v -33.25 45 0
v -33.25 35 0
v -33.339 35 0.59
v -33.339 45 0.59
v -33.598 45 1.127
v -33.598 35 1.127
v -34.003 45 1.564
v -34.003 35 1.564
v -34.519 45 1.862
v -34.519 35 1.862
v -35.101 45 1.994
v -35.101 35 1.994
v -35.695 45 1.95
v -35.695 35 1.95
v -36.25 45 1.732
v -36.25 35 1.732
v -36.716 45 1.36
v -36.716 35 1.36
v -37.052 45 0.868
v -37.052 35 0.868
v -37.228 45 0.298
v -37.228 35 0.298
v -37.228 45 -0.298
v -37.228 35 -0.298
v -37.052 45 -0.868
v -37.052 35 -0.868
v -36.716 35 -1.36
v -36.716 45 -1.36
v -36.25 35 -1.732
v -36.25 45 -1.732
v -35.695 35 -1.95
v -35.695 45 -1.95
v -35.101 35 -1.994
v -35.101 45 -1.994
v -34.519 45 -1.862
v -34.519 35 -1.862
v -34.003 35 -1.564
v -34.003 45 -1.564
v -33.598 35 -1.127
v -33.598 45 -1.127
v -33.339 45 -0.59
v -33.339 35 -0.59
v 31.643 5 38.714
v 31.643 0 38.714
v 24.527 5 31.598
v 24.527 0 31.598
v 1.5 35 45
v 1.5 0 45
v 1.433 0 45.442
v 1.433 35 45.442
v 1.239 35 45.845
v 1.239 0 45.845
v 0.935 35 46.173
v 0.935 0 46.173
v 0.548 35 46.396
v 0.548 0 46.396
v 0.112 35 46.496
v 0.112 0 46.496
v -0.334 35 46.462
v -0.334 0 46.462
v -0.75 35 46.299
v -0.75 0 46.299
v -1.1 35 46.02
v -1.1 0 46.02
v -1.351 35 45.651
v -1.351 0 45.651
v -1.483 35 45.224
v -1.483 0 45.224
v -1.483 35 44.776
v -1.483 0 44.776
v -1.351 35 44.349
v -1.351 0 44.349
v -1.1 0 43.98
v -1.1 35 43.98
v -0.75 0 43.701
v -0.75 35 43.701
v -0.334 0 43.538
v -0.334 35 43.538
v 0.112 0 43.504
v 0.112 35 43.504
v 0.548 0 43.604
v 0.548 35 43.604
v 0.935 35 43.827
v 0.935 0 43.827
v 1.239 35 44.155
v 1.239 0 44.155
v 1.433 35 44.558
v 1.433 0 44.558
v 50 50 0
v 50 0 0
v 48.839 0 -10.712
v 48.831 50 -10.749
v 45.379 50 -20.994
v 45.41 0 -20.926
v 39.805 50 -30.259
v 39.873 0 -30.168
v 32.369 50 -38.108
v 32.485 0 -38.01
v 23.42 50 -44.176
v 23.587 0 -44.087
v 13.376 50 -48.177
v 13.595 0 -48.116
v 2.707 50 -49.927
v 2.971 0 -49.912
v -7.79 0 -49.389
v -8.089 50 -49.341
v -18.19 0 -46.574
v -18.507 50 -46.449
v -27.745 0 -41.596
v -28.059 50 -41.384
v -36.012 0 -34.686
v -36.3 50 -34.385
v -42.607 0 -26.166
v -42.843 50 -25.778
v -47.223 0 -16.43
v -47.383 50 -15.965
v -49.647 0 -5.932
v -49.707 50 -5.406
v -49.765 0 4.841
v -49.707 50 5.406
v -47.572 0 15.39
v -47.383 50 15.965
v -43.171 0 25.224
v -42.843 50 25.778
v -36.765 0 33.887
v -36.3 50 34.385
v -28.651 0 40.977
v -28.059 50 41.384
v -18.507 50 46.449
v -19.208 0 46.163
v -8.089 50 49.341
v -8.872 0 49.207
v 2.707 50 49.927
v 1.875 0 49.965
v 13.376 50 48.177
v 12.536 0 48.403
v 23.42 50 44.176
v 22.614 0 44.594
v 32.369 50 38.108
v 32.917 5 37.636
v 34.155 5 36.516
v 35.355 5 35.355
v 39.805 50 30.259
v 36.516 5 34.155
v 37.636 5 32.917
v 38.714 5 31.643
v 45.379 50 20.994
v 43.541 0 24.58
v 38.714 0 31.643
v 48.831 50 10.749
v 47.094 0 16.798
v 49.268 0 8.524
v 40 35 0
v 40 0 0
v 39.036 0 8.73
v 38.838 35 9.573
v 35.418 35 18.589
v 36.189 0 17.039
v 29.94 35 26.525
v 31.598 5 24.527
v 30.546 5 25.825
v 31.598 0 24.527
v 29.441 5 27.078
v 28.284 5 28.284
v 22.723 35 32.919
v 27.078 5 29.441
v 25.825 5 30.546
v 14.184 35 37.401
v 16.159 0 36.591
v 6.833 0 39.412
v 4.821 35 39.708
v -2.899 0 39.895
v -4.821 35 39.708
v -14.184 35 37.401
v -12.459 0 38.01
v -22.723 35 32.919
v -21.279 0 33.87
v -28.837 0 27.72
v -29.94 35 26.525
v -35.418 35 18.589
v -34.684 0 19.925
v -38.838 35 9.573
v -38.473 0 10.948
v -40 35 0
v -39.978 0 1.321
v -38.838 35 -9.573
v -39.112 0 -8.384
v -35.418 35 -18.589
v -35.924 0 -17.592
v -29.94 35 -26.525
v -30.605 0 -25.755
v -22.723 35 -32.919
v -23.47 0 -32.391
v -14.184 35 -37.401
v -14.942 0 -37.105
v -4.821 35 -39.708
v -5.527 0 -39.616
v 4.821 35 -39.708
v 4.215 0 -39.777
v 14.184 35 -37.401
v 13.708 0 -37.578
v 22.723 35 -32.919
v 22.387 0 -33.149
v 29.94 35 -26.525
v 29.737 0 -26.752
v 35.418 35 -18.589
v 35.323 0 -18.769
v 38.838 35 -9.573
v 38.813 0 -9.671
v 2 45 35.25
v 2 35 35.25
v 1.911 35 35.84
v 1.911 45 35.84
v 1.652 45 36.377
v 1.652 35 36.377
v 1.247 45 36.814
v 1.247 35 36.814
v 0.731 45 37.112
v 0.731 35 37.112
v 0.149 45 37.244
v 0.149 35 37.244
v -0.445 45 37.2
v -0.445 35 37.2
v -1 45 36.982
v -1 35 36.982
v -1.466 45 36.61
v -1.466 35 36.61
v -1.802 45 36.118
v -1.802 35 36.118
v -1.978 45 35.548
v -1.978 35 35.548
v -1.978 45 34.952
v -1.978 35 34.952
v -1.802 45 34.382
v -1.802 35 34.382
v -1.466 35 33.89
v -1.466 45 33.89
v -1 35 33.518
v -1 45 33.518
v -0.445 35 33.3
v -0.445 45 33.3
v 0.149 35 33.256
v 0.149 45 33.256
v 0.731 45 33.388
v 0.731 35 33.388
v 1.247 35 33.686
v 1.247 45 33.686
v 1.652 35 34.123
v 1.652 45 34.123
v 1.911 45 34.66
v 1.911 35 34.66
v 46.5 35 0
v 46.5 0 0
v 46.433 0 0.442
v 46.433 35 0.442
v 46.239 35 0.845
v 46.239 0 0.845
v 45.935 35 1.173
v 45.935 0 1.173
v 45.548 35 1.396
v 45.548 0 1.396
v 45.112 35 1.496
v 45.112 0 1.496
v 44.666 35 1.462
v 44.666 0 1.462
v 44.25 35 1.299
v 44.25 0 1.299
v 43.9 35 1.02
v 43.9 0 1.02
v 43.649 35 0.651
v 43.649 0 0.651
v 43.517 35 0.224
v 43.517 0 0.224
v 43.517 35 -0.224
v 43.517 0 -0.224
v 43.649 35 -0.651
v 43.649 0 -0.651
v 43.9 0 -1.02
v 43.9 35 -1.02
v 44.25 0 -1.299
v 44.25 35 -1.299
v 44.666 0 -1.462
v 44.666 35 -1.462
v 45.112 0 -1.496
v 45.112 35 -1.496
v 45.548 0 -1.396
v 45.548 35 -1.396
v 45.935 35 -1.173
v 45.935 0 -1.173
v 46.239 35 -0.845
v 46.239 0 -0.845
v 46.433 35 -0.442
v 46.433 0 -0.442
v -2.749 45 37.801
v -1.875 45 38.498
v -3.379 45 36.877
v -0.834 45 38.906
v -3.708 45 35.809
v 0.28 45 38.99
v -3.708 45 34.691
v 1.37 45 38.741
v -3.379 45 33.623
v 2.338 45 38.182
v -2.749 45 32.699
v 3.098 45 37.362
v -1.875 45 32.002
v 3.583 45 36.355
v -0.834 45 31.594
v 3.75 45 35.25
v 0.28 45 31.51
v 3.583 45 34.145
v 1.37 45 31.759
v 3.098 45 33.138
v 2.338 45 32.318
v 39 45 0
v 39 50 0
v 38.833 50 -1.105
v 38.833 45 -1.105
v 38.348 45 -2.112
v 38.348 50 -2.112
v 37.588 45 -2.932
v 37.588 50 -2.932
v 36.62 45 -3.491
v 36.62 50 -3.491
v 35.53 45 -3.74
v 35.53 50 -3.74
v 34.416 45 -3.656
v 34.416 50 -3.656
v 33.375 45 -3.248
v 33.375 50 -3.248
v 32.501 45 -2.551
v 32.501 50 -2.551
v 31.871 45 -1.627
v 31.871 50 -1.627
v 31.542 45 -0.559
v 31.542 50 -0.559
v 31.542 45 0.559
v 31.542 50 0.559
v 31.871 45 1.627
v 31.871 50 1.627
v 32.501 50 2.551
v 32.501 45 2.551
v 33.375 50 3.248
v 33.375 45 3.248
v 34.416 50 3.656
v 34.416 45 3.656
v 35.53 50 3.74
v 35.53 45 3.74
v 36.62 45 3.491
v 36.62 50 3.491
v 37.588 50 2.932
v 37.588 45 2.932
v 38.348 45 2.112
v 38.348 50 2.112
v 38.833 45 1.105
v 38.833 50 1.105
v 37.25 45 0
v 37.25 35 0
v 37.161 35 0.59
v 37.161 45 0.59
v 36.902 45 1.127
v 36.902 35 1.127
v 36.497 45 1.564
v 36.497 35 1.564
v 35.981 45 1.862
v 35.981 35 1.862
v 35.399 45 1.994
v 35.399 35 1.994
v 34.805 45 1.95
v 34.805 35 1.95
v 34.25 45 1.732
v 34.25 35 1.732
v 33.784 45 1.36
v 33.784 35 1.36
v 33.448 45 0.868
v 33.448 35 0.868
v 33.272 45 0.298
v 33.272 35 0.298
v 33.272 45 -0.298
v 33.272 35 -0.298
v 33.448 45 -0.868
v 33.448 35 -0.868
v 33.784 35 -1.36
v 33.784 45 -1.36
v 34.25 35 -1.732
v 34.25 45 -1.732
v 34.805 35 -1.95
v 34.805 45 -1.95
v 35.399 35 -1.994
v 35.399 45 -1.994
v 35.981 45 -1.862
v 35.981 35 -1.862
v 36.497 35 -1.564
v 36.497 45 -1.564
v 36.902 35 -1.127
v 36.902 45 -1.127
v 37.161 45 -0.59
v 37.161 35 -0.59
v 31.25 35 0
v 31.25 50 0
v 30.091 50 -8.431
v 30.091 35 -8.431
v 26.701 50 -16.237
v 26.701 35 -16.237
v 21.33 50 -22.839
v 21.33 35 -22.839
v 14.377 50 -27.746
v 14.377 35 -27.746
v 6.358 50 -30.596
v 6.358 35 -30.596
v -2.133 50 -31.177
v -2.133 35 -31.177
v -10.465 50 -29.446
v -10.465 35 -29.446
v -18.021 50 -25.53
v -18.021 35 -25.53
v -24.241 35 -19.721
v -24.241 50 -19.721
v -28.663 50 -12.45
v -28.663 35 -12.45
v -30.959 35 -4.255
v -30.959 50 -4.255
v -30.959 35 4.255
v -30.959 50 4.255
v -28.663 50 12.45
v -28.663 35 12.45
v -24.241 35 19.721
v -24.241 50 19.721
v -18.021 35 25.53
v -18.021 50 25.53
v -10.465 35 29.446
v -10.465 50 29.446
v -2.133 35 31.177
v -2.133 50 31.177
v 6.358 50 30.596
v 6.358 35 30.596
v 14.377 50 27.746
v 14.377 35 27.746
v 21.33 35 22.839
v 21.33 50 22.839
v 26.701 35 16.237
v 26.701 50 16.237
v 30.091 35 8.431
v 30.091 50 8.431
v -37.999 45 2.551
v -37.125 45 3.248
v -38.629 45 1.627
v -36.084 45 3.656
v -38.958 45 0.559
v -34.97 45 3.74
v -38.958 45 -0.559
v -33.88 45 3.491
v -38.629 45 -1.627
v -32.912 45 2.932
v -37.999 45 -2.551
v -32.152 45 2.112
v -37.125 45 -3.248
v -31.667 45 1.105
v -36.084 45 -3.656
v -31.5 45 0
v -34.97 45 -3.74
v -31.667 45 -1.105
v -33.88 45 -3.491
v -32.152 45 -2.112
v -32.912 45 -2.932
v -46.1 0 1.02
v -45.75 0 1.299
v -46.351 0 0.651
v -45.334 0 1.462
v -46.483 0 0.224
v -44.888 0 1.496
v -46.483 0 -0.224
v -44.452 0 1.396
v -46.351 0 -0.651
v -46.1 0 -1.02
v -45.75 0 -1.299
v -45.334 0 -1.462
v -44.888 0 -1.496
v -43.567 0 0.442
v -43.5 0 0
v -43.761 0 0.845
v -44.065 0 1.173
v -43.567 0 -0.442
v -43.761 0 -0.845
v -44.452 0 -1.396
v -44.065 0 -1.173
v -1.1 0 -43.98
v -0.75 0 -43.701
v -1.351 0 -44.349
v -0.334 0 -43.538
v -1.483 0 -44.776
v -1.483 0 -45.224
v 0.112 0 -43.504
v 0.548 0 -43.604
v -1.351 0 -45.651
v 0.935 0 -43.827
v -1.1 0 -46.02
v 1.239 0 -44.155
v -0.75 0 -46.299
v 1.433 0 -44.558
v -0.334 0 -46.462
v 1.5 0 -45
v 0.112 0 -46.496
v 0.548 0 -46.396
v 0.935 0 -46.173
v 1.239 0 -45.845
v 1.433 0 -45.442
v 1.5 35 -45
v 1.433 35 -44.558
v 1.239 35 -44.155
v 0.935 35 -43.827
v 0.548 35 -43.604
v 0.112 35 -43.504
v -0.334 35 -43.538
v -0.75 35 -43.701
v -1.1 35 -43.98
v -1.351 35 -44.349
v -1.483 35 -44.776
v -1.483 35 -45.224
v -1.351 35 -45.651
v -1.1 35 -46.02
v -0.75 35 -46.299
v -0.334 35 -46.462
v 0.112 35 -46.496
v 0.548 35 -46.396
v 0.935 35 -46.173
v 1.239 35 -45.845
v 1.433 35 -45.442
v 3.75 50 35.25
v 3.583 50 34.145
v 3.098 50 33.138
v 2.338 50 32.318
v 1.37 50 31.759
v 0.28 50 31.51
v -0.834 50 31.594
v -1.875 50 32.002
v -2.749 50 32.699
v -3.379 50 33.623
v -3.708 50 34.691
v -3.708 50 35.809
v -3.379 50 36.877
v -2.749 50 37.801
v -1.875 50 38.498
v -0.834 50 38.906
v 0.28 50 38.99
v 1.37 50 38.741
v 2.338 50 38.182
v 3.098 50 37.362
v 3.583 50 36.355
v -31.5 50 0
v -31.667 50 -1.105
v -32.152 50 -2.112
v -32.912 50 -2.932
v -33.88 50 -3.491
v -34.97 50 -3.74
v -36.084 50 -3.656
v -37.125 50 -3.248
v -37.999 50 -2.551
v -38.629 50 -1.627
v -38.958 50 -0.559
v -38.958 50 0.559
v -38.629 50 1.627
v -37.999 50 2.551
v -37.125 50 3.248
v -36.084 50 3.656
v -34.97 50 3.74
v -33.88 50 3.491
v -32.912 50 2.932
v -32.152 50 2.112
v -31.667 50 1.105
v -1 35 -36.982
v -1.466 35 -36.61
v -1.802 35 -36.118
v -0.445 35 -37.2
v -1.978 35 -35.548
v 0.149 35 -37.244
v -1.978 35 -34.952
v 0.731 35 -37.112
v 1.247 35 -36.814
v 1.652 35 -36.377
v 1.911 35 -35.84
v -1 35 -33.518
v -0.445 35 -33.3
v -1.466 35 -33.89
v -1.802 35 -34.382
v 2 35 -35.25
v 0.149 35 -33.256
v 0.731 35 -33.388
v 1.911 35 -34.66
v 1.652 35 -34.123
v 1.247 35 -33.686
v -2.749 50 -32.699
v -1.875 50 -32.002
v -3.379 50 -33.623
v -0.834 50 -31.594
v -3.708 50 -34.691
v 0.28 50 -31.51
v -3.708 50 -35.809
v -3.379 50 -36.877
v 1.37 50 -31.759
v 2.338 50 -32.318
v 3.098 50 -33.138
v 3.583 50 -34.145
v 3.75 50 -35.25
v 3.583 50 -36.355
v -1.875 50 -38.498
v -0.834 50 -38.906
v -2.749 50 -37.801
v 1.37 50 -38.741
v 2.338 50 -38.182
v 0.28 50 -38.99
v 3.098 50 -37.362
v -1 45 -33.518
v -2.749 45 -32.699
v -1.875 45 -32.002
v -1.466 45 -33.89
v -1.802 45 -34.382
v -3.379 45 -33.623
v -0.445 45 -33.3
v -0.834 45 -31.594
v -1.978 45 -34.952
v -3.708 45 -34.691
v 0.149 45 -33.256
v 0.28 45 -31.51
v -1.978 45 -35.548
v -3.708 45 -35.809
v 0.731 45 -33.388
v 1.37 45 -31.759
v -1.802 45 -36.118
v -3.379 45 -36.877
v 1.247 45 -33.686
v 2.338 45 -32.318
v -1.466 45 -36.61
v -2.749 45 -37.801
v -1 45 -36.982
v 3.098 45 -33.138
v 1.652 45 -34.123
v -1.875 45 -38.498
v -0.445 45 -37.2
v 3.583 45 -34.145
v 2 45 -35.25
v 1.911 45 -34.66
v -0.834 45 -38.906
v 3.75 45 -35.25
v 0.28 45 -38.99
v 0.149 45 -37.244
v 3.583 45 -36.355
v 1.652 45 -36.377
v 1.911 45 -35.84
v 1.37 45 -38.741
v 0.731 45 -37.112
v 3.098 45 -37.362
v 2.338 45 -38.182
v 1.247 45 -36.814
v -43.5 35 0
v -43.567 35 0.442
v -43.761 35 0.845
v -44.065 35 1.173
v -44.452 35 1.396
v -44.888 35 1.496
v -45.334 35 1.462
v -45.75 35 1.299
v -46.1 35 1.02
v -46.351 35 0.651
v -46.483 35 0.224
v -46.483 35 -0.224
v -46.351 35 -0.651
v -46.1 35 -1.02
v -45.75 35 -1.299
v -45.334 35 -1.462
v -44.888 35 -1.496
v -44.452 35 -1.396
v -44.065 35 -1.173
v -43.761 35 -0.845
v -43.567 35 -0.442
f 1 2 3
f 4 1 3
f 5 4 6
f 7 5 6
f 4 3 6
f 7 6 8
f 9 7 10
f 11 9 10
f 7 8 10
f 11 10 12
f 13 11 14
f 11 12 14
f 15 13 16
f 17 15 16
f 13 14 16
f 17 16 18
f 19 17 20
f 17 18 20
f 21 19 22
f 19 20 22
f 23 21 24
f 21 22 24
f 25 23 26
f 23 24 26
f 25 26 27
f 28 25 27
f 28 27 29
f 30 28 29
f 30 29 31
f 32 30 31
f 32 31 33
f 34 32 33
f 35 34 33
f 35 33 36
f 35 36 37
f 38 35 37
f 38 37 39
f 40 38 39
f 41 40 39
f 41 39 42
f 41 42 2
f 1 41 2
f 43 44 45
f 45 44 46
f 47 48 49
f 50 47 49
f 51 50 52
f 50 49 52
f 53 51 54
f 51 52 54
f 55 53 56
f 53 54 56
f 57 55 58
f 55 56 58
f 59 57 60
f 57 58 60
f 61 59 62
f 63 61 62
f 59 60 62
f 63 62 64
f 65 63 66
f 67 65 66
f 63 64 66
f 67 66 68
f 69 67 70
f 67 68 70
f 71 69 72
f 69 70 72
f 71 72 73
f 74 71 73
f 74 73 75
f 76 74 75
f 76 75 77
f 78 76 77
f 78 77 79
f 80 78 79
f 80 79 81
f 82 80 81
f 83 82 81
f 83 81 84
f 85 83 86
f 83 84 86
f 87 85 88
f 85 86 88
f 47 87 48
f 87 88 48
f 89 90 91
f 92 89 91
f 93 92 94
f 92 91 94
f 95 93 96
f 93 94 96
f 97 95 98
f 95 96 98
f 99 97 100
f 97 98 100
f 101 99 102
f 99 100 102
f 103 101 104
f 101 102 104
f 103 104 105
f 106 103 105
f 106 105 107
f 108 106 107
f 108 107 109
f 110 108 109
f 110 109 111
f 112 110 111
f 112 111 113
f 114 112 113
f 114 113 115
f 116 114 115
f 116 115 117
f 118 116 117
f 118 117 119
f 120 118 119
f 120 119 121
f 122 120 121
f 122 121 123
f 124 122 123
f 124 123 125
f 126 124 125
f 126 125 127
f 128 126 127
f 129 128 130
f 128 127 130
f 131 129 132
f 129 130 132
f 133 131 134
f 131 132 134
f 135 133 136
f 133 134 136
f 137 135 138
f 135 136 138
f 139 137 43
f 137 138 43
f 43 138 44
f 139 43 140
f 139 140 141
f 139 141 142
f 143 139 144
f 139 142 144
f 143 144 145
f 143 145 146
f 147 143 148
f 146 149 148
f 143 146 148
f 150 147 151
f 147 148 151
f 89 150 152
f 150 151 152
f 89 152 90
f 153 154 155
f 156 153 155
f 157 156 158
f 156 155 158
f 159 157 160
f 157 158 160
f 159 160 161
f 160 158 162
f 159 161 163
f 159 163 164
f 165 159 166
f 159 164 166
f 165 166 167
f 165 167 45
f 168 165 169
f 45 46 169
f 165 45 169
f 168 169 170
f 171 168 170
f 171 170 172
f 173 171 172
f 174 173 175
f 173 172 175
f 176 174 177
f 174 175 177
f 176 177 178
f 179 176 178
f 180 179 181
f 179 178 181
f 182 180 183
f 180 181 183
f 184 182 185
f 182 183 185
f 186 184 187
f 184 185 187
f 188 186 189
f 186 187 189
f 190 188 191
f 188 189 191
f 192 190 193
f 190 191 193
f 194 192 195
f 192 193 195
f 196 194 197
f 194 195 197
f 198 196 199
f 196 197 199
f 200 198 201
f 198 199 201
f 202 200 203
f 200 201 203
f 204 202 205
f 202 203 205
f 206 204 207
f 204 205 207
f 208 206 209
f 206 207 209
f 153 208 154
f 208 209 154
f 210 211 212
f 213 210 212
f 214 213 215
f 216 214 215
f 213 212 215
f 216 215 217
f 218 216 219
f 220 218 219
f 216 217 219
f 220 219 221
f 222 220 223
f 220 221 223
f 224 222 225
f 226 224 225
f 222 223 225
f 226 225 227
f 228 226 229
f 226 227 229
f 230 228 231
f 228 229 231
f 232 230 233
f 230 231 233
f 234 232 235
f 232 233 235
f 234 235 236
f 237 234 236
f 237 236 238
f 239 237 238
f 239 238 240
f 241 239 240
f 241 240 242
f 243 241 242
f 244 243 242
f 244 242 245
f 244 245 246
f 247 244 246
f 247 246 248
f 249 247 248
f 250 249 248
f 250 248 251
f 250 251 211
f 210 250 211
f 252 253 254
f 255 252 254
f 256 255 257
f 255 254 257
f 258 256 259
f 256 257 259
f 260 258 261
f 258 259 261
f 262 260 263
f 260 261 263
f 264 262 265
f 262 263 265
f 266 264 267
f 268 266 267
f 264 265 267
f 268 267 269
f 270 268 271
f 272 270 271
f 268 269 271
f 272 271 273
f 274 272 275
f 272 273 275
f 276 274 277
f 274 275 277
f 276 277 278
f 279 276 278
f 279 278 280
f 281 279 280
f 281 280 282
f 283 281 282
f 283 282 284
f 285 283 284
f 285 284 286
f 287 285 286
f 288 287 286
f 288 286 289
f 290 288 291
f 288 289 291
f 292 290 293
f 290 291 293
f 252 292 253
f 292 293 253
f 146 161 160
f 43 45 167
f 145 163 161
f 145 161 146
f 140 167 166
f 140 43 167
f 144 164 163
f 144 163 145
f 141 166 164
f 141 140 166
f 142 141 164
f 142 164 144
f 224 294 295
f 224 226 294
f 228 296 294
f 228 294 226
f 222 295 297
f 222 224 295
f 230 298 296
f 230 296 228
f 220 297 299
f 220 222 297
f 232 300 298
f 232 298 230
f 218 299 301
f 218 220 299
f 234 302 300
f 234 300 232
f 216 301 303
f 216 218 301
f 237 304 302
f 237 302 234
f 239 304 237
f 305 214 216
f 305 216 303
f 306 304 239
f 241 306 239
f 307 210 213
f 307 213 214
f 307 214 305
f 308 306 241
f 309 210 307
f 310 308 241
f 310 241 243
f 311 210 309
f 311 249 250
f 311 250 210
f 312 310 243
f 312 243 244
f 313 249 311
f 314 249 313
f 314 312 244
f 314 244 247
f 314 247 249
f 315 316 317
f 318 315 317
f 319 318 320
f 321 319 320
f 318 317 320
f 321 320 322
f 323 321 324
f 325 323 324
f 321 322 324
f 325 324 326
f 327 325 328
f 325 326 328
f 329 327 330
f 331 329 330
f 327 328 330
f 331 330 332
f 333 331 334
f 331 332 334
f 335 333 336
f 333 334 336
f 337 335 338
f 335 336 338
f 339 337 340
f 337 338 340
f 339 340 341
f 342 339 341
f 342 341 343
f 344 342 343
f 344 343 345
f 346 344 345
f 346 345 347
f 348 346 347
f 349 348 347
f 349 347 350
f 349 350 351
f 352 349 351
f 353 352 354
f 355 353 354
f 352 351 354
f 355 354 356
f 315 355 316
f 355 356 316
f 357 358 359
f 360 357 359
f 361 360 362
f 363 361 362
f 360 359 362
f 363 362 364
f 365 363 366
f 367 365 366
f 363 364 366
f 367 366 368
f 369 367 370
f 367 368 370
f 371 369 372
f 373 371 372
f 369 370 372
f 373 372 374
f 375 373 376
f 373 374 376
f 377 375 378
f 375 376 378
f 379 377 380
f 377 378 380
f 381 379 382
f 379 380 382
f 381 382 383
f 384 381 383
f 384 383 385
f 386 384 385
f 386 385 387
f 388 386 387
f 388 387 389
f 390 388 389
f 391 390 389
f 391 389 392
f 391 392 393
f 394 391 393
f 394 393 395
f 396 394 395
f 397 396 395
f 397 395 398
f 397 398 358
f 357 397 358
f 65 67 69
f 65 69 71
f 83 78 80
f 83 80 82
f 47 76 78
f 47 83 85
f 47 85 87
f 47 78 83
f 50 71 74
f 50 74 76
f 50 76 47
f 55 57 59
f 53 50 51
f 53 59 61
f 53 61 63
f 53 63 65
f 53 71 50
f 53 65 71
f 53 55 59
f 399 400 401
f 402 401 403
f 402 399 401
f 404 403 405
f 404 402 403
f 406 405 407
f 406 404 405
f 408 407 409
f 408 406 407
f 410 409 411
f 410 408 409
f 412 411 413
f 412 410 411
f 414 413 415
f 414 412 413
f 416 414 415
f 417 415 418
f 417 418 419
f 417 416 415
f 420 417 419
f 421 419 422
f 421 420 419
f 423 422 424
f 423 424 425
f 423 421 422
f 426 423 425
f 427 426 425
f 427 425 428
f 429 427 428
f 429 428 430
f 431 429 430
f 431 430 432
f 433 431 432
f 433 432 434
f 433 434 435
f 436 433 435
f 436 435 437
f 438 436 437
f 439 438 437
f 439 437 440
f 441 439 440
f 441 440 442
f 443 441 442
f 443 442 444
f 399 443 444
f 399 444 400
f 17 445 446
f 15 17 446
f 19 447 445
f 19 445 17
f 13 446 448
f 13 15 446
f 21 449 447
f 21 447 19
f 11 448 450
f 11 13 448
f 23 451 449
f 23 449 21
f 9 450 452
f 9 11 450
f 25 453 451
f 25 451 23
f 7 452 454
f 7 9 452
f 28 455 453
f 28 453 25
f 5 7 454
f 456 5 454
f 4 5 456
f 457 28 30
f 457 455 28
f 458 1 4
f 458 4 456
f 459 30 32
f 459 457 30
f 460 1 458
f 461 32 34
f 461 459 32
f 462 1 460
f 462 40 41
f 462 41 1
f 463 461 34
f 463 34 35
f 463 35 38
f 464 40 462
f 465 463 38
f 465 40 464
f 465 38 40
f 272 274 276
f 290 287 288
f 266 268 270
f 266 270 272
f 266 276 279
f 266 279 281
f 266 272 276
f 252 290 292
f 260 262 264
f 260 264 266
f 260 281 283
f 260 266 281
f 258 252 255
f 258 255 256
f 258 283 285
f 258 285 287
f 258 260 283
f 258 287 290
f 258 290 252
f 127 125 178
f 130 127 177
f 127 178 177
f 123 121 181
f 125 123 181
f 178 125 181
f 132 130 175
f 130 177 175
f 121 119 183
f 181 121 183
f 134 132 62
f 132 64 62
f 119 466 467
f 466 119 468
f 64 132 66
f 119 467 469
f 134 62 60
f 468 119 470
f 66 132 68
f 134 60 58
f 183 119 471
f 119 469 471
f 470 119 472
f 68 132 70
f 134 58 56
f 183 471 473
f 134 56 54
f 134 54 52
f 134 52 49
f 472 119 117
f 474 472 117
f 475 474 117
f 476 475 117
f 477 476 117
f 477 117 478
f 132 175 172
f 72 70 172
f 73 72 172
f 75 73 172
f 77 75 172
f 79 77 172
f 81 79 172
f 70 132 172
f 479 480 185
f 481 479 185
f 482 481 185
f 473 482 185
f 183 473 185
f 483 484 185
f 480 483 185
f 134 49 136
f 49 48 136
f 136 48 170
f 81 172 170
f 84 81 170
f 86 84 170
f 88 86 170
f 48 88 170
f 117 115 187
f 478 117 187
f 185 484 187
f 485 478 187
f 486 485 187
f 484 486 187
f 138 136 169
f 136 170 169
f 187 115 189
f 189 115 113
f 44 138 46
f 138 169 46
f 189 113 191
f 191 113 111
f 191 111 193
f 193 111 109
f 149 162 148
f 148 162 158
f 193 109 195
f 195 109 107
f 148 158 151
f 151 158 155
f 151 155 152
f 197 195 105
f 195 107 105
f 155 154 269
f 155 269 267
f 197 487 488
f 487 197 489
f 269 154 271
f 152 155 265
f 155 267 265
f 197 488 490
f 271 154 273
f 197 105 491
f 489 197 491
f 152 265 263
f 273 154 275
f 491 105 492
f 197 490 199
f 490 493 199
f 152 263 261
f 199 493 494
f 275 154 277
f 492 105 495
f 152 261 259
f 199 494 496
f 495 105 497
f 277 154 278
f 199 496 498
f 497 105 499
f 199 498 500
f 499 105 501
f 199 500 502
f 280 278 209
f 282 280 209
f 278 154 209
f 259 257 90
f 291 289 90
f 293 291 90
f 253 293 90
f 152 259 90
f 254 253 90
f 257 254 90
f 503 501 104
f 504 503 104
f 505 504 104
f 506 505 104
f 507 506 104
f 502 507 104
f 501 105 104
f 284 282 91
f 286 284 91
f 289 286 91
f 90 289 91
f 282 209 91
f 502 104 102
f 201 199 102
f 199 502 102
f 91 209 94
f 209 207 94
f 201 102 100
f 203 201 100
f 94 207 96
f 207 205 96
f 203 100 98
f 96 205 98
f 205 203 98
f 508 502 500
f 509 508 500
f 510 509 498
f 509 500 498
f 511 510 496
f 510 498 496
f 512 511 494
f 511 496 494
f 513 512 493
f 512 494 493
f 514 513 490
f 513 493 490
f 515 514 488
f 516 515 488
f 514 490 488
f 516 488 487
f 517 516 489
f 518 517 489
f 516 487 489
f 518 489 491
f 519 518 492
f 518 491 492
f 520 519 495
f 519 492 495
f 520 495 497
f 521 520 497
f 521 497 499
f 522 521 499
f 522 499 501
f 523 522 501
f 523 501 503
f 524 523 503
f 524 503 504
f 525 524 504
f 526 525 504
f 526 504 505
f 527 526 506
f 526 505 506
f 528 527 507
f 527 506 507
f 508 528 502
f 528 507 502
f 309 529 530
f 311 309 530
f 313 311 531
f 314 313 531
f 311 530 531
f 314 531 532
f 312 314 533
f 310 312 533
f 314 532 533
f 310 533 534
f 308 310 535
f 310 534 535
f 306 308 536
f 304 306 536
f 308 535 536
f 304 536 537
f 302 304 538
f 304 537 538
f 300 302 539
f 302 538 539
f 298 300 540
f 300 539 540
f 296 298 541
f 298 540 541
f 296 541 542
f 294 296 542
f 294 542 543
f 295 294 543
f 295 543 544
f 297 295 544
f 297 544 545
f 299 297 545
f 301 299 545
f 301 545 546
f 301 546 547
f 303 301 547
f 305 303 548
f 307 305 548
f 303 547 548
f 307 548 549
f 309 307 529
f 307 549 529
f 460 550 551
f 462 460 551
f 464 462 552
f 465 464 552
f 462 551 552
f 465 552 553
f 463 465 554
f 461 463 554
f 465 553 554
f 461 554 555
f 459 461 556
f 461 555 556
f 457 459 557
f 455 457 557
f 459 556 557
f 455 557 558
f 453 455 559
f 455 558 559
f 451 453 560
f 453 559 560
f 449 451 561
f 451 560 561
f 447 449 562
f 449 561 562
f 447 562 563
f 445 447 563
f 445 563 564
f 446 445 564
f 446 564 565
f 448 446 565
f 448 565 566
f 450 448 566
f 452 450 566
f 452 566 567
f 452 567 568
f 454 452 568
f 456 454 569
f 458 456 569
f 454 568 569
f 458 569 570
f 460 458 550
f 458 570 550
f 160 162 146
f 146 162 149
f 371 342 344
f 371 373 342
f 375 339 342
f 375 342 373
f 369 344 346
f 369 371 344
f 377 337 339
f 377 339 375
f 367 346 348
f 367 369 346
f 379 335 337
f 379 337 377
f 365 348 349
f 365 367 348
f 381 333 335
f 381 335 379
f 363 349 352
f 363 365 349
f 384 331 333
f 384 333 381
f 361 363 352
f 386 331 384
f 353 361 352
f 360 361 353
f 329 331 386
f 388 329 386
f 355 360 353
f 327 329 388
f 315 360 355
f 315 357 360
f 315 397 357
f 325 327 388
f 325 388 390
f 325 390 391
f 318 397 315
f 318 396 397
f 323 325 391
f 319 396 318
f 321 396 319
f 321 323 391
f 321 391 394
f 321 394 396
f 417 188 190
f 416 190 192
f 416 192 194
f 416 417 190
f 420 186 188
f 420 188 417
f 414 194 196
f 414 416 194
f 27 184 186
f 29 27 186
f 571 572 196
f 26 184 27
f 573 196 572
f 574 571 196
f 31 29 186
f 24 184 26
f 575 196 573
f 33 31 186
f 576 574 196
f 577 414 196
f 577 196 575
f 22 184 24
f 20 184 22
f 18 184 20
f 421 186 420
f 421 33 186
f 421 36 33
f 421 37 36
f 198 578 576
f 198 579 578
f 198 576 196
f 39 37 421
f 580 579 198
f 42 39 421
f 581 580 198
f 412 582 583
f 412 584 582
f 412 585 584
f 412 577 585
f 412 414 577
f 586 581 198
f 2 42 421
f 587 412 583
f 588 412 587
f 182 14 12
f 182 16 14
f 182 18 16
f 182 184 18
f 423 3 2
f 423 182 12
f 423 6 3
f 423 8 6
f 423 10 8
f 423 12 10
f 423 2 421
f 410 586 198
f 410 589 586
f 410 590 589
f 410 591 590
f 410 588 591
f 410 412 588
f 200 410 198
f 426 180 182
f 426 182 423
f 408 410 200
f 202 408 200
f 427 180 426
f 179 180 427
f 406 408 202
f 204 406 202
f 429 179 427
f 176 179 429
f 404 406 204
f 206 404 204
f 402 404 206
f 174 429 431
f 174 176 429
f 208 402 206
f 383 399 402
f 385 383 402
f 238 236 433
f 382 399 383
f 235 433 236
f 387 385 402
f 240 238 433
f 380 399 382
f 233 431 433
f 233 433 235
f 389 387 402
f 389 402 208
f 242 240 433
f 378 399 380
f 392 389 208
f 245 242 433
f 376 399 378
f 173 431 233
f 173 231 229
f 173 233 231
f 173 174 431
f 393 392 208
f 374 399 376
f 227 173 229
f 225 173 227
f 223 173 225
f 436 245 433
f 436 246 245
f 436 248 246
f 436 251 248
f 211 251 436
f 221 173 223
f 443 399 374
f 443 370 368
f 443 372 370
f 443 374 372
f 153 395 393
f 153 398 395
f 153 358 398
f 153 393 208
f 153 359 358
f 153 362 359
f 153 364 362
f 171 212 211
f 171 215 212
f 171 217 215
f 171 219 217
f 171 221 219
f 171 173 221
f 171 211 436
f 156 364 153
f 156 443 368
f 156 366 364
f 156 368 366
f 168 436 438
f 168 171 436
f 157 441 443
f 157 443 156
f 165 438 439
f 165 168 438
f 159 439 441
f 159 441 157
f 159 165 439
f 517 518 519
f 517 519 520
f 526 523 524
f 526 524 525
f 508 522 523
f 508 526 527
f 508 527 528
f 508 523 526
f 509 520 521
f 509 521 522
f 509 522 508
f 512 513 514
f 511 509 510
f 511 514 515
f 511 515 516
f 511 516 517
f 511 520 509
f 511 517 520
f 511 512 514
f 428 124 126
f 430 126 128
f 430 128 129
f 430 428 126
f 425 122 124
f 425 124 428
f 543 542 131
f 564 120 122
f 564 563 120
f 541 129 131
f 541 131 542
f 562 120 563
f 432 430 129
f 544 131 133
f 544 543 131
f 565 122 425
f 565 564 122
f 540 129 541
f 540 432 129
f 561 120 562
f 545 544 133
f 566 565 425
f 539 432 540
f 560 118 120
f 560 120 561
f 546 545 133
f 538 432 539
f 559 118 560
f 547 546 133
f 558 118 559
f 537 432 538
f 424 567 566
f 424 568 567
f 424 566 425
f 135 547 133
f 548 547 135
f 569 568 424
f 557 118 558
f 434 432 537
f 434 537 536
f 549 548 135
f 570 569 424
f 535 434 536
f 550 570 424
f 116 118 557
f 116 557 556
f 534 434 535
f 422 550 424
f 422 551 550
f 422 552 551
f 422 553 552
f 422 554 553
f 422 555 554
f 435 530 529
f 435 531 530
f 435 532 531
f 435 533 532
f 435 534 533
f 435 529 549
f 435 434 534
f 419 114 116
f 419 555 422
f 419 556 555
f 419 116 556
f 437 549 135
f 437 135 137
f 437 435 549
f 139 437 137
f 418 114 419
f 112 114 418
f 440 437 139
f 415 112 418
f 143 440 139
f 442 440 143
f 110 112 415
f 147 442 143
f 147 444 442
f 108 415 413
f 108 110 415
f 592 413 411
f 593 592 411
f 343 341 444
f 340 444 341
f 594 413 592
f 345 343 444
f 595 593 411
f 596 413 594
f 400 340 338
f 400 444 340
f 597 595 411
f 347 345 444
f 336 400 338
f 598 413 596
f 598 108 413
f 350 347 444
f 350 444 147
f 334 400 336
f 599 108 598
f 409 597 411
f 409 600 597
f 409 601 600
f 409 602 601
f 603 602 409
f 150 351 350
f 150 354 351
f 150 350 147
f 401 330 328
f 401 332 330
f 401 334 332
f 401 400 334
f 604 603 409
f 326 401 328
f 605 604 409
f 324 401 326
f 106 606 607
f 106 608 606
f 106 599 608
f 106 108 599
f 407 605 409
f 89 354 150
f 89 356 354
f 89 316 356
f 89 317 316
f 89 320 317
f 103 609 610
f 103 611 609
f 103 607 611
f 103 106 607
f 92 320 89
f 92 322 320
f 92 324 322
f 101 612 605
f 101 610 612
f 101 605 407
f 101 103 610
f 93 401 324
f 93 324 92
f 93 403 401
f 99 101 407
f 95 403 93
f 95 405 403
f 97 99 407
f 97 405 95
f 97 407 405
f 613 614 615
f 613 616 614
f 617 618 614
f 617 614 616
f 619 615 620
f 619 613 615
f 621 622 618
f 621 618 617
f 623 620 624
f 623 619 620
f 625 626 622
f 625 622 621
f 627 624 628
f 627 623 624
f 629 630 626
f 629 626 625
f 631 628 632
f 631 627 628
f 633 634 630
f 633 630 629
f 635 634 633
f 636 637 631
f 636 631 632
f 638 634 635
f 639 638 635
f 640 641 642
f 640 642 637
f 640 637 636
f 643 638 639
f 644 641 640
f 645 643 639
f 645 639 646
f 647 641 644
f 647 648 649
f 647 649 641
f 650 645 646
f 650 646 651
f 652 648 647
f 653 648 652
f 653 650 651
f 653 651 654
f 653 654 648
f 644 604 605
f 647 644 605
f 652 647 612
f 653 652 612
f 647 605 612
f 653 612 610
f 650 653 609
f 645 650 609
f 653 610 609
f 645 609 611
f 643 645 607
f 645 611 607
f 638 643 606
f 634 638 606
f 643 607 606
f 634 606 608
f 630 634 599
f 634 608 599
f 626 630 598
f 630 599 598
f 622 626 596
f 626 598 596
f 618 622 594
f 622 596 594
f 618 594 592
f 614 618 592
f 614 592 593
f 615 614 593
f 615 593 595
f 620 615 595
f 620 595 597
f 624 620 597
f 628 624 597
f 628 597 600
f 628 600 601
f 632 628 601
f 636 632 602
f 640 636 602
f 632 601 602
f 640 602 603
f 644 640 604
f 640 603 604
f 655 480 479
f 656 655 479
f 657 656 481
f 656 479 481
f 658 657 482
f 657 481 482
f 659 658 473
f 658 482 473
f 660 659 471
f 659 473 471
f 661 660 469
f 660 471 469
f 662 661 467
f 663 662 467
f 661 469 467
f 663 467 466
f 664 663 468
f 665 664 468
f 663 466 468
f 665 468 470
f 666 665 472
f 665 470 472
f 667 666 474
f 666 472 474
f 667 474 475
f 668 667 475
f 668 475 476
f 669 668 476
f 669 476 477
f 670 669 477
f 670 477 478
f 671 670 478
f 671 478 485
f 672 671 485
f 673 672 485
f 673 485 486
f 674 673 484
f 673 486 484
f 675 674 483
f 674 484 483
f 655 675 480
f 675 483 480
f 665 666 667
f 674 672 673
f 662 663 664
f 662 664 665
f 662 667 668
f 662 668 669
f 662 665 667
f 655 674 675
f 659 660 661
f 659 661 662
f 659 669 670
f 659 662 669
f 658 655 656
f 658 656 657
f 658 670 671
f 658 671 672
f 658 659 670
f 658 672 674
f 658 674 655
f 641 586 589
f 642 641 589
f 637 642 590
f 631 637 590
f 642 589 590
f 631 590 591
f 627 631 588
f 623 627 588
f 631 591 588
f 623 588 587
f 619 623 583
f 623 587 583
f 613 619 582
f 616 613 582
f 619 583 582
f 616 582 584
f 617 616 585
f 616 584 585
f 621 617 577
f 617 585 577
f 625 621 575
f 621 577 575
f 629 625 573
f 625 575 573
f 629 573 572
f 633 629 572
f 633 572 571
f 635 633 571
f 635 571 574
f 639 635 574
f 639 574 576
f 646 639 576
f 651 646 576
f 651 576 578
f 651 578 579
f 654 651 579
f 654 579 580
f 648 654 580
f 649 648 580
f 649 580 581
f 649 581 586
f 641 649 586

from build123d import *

# Parameters (mm, degrees)
CROQUIS1_R              = 50
CROQUIS1_R_2            = 31.25
SALIENTE_EXTRUIR1_DEPTH = 50
CROQUIS2_R              = 40
CORTAR_EXTRUIR1_DEPTH   = 35
CROQUIS3_R              = 1.5
CORTAR_EXTRUIR2_DEPTH   = 35
CROQUIS3_3_R            = 2
CORTAR_EXTRUIR3_DEPTH   = 87.602540378
CROQUIS4_R              = 3.75
CORTAR_EXTRUIR4_DEPTH   = 5
CORTAR_EXTRUIR5_DEPTH   = 5


with BuildPart() as part:
    # Croquis1 → Saliente-Extruir1 (new body)
    with BuildSketch(Plane(origin=(0, 0, 0), x_dir=(1, 0, 0), z_dir=(0, 1, 0))):
        Circle(CROQUIS1_R)
        Circle(CROQUIS1_R_2, mode=Mode.SUBTRACT)
    extrude(amount=SALIENTE_EXTRUIR1_DEPTH)

    # Croquis2 → Cortar-Extruir1 (cut)
    with BuildSketch(Plane.XZ):
        Circle(CROQUIS2_R)
    extrude(amount=-CORTAR_EXTRUIR1_DEPTH, mode=Mode.SUBTRACT)

    # Croquis3 → Cortar-Extruir2 (cut)
    with BuildSketch(Plane.XZ):
        with Locations((0, 45)):
            Circle(CROQUIS3_R)
        with Locations((45, 0)):
            Circle(CROQUIS3_R)
        with Locations((0, -45)):
            Circle(CROQUIS3_R)
        with Locations((-45, 0)):
            Circle(CROQUIS3_R)
    extrude(amount=-CORTAR_EXTRUIR2_DEPTH, mode=Mode.SUBTRACT)

    # Croquis3<3> → Cortar-Extruir3 (cut, through all)
    with BuildSketch(Plane.XZ):
        with Locations((0, 35.25)):
            Circle(CROQUIS3_3_R)
        with Locations((35.25, 0)):
            Circle(CROQUIS3_3_R)
        with Locations((0, -35.25)):
            Circle(CROQUIS3_3_R)
        with Locations((-35.25, 0)):
            Circle(CROQUIS3_3_R)
    extrude(amount=-CORTAR_EXTRUIR3_DEPTH, mode=Mode.SUBTRACT)

    # Croquis4 → Cortar-Extruir4 (cut)
    with BuildSketch(Plane(origin=(0, 50, 0), x_dir=(1, 0, 0), z_dir=(0, 1, 0))):
        with Locations((0, 35.25)):
            Circle(CROQUIS4_R)
        with Locations((35.25, 0)):
            Circle(CROQUIS4_R)
        with Locations((0, -35.25)):
            Circle(CROQUIS4_R)
        with Locations((-35.25, 0)):
            Circle(CROQUIS4_R)
    extrude(amount=-CORTAR_EXTRUIR4_DEPTH, mode=Mode.SUBTRACT)

    # Croquis8 → Cortar-Extruir5 (cut)
    with BuildSketch(Plane.XZ):
        with BuildLine():
            ThreePointArc((38.713652105, 31.642584293), (35.355339059, 35.355339059), (31.642584293, 38.713652105))
            Line((31.642584293, 38.713652105), (24.526896495, 31.597964307))
            ThreePointArc((24.526896495, 31.597964307), (28.284271247, 28.284271247), (31.597964307, 24.526896495))
            Line((31.597964307, 24.526896495), (38.713652105, 31.642584293))
        make_face()
    extrude(amount=-CORTAR_EXTRUIR5_DEPTH, mode=Mode.SUBTRACT)


solid = part.part
